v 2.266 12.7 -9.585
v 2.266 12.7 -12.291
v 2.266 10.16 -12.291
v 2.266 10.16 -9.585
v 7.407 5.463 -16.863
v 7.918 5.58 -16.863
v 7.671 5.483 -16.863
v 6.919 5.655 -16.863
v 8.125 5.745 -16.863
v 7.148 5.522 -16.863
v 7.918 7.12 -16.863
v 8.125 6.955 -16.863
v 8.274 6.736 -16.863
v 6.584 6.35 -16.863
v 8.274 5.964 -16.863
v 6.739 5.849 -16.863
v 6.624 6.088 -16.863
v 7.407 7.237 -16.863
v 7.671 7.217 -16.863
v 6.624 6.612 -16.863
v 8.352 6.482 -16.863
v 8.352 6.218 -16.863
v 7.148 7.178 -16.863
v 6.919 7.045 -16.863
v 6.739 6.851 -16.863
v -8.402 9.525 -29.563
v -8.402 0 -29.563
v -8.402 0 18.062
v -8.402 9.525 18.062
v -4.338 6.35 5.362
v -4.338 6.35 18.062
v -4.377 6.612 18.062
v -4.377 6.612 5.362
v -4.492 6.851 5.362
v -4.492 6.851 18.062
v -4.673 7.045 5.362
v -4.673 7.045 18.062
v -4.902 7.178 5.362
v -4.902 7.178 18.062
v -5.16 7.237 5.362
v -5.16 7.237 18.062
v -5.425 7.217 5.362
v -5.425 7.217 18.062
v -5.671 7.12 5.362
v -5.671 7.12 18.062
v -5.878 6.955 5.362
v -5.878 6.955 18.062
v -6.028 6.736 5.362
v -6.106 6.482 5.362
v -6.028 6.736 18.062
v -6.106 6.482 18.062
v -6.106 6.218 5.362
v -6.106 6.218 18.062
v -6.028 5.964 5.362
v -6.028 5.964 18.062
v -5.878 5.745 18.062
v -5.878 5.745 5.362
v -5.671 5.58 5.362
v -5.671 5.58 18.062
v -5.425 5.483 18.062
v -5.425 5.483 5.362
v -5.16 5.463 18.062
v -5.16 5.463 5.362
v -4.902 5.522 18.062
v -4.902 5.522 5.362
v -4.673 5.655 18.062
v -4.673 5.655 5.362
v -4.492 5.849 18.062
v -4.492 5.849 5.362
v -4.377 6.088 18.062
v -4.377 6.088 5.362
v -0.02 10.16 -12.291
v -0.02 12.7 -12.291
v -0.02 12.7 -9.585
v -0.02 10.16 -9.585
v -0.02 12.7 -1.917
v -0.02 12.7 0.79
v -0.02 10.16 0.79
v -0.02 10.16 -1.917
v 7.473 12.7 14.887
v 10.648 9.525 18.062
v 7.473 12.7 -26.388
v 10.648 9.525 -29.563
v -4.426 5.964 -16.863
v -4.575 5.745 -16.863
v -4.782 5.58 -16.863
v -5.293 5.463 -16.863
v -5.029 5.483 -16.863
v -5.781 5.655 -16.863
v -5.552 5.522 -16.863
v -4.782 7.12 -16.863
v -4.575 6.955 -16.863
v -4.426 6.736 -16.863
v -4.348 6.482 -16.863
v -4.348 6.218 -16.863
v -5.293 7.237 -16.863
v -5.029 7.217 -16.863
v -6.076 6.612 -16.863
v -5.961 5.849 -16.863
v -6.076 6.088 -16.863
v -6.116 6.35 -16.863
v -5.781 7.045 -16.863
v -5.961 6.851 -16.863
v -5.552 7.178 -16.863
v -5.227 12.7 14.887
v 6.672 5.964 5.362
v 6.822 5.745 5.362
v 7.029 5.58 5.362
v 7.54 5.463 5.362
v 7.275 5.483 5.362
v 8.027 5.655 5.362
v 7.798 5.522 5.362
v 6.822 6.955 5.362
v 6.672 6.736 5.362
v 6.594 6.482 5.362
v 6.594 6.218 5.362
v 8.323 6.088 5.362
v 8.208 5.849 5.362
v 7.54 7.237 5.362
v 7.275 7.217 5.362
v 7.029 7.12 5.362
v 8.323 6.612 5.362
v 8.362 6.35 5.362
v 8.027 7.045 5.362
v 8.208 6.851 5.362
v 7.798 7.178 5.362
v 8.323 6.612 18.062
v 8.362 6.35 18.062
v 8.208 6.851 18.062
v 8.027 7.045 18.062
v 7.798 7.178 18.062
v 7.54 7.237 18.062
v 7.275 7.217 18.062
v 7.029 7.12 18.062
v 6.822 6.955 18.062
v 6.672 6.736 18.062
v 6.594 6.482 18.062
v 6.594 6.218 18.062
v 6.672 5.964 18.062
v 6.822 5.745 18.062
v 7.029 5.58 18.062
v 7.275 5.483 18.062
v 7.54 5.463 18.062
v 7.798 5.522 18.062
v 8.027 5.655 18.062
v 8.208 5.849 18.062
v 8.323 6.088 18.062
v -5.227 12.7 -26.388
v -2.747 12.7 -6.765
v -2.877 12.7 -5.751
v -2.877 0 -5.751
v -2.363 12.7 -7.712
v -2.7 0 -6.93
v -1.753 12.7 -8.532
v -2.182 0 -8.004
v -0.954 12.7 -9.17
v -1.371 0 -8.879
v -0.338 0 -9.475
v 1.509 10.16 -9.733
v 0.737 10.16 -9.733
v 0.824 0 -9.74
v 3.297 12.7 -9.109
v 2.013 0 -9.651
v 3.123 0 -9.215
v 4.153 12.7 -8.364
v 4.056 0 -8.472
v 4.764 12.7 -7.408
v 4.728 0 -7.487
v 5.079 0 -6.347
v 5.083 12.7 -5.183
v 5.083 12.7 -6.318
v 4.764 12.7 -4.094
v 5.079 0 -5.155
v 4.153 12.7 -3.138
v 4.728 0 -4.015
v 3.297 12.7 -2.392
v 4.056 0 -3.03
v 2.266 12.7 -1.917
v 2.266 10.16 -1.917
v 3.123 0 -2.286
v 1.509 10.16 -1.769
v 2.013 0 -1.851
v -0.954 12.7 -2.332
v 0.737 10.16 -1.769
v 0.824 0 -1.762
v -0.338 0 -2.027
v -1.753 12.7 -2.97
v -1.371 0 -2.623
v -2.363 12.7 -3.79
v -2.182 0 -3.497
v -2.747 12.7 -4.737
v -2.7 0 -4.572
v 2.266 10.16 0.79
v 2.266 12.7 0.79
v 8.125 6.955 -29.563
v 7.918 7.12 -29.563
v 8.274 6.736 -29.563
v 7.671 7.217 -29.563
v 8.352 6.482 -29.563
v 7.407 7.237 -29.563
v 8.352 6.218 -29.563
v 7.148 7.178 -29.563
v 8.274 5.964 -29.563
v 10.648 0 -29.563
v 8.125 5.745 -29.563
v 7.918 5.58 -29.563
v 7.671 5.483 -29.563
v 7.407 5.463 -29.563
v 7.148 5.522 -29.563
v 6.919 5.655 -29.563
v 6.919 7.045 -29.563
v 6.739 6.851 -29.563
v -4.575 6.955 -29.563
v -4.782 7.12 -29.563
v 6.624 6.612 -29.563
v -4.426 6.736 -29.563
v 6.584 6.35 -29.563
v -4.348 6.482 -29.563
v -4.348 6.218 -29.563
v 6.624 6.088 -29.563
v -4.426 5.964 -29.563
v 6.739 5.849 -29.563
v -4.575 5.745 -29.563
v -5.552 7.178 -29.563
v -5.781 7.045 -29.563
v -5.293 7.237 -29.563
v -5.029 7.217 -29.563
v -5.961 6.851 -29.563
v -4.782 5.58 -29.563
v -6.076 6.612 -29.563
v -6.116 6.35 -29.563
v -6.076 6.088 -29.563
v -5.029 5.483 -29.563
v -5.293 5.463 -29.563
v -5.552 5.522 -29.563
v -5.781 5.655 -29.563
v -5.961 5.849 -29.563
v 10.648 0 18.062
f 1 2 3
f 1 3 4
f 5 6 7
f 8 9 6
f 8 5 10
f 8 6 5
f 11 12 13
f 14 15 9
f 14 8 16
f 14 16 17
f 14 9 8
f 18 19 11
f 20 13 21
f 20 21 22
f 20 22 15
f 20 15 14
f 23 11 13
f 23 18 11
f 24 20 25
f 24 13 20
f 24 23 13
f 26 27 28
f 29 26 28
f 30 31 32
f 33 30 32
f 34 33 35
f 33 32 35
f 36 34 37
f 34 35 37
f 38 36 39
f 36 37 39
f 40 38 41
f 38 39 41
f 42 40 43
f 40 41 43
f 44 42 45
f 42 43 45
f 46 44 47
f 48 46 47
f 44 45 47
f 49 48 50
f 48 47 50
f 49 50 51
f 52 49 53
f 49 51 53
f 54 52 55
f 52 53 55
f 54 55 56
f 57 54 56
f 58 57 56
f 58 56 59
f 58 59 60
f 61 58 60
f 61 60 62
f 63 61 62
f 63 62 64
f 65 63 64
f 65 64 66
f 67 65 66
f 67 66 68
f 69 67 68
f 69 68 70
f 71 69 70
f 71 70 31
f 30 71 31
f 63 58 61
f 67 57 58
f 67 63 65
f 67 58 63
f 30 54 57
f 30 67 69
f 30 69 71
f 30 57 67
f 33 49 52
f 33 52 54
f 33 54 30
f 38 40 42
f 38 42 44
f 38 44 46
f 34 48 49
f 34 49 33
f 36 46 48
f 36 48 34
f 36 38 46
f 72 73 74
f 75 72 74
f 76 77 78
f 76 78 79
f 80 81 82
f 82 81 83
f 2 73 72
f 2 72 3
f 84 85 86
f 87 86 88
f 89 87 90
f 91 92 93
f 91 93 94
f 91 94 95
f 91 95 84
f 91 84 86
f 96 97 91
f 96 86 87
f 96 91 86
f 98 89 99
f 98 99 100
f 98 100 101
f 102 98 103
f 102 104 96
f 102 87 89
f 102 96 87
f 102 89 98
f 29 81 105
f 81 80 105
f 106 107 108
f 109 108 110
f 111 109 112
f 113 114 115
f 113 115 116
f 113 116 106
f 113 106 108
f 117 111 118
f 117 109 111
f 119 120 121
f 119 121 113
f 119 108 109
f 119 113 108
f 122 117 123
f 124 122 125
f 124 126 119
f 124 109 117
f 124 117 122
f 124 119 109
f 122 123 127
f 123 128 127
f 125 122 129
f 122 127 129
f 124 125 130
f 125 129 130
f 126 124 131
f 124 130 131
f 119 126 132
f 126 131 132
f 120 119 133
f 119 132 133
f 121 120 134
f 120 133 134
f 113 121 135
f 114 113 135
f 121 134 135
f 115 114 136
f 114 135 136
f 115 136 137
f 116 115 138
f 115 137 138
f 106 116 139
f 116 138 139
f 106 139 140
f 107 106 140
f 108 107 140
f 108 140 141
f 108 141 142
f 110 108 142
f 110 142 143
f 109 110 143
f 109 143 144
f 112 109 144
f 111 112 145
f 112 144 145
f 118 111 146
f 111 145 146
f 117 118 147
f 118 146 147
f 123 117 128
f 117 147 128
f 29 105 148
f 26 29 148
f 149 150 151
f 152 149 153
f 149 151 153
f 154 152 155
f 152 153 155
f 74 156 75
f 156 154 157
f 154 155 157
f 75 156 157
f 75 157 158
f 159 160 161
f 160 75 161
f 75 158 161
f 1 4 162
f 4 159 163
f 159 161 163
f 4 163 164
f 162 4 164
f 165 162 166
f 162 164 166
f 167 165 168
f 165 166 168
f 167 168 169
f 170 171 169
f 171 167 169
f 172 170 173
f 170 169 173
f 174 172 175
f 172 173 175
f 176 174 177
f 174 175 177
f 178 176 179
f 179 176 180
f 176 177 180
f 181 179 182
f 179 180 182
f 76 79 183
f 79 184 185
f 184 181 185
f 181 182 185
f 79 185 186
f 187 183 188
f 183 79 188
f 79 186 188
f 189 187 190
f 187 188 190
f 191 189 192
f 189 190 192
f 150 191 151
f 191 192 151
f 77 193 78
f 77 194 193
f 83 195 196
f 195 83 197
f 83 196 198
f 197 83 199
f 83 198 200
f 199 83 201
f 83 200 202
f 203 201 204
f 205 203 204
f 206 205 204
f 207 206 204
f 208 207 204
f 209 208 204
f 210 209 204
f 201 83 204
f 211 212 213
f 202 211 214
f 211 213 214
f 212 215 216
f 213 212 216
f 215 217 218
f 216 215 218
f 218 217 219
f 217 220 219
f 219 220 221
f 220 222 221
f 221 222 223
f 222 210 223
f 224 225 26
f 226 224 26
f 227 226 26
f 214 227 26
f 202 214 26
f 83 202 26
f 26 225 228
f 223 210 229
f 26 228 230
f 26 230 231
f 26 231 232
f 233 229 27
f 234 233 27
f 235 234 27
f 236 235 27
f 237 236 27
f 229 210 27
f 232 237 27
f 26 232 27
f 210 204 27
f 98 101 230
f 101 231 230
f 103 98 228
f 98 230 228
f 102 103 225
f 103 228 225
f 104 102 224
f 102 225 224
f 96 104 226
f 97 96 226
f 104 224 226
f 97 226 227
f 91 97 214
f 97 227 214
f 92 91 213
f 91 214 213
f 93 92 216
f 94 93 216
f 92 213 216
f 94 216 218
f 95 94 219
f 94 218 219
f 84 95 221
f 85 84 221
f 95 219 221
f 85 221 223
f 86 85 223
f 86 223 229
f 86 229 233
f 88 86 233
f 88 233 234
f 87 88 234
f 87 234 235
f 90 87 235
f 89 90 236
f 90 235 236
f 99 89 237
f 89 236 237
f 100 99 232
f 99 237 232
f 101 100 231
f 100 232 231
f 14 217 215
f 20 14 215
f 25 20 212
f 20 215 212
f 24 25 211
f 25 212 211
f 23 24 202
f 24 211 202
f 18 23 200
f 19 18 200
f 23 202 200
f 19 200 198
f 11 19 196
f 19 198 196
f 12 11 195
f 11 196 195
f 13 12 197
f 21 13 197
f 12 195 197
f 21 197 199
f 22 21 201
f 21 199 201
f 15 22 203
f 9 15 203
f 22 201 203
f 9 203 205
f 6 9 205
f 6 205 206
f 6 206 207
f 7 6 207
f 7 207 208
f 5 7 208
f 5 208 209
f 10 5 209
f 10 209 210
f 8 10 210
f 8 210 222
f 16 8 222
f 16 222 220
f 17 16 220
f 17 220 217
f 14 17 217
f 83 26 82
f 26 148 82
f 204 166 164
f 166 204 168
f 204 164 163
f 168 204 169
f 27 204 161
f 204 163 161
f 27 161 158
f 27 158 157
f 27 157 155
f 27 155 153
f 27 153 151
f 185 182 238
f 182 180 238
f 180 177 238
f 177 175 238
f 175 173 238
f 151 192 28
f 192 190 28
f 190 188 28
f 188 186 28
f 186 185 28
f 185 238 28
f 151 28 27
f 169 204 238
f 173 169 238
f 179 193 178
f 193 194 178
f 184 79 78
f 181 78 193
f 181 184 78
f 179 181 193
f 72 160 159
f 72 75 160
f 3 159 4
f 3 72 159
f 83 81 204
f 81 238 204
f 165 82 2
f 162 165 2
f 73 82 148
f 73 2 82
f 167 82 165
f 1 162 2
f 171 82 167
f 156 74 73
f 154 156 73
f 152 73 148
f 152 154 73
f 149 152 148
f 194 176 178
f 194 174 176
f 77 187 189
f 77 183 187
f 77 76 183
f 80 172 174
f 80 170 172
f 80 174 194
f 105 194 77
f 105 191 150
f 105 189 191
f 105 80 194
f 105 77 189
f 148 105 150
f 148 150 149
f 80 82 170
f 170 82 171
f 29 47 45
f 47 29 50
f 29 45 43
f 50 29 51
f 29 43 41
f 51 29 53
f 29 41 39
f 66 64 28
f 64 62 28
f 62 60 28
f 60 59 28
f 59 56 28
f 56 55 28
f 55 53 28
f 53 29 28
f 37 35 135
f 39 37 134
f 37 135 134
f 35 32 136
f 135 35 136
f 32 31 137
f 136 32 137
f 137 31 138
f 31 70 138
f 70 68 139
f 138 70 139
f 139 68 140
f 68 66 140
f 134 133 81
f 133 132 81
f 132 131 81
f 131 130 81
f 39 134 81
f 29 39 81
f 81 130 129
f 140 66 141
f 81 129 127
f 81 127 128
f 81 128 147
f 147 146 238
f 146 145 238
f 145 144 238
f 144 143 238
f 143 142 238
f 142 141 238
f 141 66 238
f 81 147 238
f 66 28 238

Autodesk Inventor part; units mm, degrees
ref_plane "YZ Plane" through (0, 0, 0) normal (1, 0, 0) x (0, 1, 0)
ref_plane "XZ Plane" through (0, 0, 0) normal (0, 1, 0) x (-1, 0, 0)
ref_plane "XY Plane" through (0, 0, 0) normal (0, 0, 1) x (1, 0, 0)
sketch "Sketch1" plane through (0, 0, 0) normal (0, 1, 0) x (-1, 0, 0)
  line L0 (8.4018, 18.0616) -> (-10.6482, 18.0616)
  line L1 (-10.6482, 18.0616) -> (-10.6482, -29.5634)
  line L2 (-10.6482, -29.5634) -> (8.4018, -29.5634)
  line L3 (8.4018, -29.5634) -> (8.4018, 18.0616)
  circle A0 centre (-1.1232, -5.7509) radius 4.0005
  point P0 (0, 0)
  dimension "d0" = 19.05
  dimension "d1" = 47.625
  dimension "d2" = 8.001
extrude "Extrusion1" add sketch "Sketch1" along normal blind 12.7
sketch "Sketch2" plane through (-8.4018, 0, 18.0616) normal (0, 0, 1) x (1, 0, 0)
  line L0 (0, 0) -> (0, 12.7) projected
  line L1 (0, 6.35) -> (18.844, 6.35)
  circle A0 centre (3.175, 6.35) radius 0.889
  circle A1 centre (15.875, 6.35) radius 0.889
  point P0 (8.4018, 0)
  dimension "d5" = 12.7
  dimension "d6" = 3.175
  dimension "d7" = 1.778
  dimension "d8" = 1.778
extrude "Extrusion2" cut sketch "Sketch2" against normal blind 12.7
sketch "Sketch3" plane through (10.6482, 0, -29.5634) normal (0, 0, -1) x (-1, 0, 0)
  circle A0 centre (3.175, 6.35) radius 0.889 projected
  circle A1 centre (15.875, 6.35) radius 0.889 projected
  point P0 (10.6482, 0)
extrude "Extrusion3" cut sketch "Sketch3" against normal blind 12.7
chamfer "Chamfer1" distance 3.175 angle 45 4 edges at (10.6482, 12.7, -5.7509) (-8.4018, 12.7, -5.7509) (1.1232, 12.7, 18.0616) (1.1232, 12.7, -29.5634)
sketch "Sketch4" plane through (0, 12.7, 0) normal (0, 1, 0) x (1, 0, 0)
  circle A0 centre (1.1232, 5.7509) radius 4.0005 projected
  line L0 (2.2662, 1.7504) -> (2.2662, -0.7896)
  line L1 (2.2662, -0.7896) -> (-0.0198, -0.7896)
  line L2 (-0.0198, -0.7896) -> (-0.0198, 1.7504)
  line L3 (-0.0198, 1.7504) -> (-0.0198, 1.9172)
  line L4 (2.2662, 1.7504) -> (2.2662, 1.9172)
  line L5 (2.2662, 12.2914) -> (2.2662, 9.7514)
  line L6 (-0.0198, 12.2914) -> (2.2662, 12.2914)
  line L7 (-0.0198, 9.7514) -> (-0.0198, 12.2914)
  line L8 (2.2662, 9.7514) -> (2.2662, 9.5847)
  line L9 (-6.1158, 16.8634) -> (-4.3378, 16.8634) projected
  line L10 (-0.0198, 9.7514) -> (-0.0198, 9.5847)
  point P0 (0, 0)
  point P1 (1.1232, 1.7504)
  dimension "d18" = 2.54
  dimension "d21" = 360
extrude "Extrusion4" cut sketch "Sketch4" against normal blind 2.54 contours A0 L10 L7 L6 L5 L8 | L4 L0 L1 L2 L3 A0
properties part number "bottom_anchor"
